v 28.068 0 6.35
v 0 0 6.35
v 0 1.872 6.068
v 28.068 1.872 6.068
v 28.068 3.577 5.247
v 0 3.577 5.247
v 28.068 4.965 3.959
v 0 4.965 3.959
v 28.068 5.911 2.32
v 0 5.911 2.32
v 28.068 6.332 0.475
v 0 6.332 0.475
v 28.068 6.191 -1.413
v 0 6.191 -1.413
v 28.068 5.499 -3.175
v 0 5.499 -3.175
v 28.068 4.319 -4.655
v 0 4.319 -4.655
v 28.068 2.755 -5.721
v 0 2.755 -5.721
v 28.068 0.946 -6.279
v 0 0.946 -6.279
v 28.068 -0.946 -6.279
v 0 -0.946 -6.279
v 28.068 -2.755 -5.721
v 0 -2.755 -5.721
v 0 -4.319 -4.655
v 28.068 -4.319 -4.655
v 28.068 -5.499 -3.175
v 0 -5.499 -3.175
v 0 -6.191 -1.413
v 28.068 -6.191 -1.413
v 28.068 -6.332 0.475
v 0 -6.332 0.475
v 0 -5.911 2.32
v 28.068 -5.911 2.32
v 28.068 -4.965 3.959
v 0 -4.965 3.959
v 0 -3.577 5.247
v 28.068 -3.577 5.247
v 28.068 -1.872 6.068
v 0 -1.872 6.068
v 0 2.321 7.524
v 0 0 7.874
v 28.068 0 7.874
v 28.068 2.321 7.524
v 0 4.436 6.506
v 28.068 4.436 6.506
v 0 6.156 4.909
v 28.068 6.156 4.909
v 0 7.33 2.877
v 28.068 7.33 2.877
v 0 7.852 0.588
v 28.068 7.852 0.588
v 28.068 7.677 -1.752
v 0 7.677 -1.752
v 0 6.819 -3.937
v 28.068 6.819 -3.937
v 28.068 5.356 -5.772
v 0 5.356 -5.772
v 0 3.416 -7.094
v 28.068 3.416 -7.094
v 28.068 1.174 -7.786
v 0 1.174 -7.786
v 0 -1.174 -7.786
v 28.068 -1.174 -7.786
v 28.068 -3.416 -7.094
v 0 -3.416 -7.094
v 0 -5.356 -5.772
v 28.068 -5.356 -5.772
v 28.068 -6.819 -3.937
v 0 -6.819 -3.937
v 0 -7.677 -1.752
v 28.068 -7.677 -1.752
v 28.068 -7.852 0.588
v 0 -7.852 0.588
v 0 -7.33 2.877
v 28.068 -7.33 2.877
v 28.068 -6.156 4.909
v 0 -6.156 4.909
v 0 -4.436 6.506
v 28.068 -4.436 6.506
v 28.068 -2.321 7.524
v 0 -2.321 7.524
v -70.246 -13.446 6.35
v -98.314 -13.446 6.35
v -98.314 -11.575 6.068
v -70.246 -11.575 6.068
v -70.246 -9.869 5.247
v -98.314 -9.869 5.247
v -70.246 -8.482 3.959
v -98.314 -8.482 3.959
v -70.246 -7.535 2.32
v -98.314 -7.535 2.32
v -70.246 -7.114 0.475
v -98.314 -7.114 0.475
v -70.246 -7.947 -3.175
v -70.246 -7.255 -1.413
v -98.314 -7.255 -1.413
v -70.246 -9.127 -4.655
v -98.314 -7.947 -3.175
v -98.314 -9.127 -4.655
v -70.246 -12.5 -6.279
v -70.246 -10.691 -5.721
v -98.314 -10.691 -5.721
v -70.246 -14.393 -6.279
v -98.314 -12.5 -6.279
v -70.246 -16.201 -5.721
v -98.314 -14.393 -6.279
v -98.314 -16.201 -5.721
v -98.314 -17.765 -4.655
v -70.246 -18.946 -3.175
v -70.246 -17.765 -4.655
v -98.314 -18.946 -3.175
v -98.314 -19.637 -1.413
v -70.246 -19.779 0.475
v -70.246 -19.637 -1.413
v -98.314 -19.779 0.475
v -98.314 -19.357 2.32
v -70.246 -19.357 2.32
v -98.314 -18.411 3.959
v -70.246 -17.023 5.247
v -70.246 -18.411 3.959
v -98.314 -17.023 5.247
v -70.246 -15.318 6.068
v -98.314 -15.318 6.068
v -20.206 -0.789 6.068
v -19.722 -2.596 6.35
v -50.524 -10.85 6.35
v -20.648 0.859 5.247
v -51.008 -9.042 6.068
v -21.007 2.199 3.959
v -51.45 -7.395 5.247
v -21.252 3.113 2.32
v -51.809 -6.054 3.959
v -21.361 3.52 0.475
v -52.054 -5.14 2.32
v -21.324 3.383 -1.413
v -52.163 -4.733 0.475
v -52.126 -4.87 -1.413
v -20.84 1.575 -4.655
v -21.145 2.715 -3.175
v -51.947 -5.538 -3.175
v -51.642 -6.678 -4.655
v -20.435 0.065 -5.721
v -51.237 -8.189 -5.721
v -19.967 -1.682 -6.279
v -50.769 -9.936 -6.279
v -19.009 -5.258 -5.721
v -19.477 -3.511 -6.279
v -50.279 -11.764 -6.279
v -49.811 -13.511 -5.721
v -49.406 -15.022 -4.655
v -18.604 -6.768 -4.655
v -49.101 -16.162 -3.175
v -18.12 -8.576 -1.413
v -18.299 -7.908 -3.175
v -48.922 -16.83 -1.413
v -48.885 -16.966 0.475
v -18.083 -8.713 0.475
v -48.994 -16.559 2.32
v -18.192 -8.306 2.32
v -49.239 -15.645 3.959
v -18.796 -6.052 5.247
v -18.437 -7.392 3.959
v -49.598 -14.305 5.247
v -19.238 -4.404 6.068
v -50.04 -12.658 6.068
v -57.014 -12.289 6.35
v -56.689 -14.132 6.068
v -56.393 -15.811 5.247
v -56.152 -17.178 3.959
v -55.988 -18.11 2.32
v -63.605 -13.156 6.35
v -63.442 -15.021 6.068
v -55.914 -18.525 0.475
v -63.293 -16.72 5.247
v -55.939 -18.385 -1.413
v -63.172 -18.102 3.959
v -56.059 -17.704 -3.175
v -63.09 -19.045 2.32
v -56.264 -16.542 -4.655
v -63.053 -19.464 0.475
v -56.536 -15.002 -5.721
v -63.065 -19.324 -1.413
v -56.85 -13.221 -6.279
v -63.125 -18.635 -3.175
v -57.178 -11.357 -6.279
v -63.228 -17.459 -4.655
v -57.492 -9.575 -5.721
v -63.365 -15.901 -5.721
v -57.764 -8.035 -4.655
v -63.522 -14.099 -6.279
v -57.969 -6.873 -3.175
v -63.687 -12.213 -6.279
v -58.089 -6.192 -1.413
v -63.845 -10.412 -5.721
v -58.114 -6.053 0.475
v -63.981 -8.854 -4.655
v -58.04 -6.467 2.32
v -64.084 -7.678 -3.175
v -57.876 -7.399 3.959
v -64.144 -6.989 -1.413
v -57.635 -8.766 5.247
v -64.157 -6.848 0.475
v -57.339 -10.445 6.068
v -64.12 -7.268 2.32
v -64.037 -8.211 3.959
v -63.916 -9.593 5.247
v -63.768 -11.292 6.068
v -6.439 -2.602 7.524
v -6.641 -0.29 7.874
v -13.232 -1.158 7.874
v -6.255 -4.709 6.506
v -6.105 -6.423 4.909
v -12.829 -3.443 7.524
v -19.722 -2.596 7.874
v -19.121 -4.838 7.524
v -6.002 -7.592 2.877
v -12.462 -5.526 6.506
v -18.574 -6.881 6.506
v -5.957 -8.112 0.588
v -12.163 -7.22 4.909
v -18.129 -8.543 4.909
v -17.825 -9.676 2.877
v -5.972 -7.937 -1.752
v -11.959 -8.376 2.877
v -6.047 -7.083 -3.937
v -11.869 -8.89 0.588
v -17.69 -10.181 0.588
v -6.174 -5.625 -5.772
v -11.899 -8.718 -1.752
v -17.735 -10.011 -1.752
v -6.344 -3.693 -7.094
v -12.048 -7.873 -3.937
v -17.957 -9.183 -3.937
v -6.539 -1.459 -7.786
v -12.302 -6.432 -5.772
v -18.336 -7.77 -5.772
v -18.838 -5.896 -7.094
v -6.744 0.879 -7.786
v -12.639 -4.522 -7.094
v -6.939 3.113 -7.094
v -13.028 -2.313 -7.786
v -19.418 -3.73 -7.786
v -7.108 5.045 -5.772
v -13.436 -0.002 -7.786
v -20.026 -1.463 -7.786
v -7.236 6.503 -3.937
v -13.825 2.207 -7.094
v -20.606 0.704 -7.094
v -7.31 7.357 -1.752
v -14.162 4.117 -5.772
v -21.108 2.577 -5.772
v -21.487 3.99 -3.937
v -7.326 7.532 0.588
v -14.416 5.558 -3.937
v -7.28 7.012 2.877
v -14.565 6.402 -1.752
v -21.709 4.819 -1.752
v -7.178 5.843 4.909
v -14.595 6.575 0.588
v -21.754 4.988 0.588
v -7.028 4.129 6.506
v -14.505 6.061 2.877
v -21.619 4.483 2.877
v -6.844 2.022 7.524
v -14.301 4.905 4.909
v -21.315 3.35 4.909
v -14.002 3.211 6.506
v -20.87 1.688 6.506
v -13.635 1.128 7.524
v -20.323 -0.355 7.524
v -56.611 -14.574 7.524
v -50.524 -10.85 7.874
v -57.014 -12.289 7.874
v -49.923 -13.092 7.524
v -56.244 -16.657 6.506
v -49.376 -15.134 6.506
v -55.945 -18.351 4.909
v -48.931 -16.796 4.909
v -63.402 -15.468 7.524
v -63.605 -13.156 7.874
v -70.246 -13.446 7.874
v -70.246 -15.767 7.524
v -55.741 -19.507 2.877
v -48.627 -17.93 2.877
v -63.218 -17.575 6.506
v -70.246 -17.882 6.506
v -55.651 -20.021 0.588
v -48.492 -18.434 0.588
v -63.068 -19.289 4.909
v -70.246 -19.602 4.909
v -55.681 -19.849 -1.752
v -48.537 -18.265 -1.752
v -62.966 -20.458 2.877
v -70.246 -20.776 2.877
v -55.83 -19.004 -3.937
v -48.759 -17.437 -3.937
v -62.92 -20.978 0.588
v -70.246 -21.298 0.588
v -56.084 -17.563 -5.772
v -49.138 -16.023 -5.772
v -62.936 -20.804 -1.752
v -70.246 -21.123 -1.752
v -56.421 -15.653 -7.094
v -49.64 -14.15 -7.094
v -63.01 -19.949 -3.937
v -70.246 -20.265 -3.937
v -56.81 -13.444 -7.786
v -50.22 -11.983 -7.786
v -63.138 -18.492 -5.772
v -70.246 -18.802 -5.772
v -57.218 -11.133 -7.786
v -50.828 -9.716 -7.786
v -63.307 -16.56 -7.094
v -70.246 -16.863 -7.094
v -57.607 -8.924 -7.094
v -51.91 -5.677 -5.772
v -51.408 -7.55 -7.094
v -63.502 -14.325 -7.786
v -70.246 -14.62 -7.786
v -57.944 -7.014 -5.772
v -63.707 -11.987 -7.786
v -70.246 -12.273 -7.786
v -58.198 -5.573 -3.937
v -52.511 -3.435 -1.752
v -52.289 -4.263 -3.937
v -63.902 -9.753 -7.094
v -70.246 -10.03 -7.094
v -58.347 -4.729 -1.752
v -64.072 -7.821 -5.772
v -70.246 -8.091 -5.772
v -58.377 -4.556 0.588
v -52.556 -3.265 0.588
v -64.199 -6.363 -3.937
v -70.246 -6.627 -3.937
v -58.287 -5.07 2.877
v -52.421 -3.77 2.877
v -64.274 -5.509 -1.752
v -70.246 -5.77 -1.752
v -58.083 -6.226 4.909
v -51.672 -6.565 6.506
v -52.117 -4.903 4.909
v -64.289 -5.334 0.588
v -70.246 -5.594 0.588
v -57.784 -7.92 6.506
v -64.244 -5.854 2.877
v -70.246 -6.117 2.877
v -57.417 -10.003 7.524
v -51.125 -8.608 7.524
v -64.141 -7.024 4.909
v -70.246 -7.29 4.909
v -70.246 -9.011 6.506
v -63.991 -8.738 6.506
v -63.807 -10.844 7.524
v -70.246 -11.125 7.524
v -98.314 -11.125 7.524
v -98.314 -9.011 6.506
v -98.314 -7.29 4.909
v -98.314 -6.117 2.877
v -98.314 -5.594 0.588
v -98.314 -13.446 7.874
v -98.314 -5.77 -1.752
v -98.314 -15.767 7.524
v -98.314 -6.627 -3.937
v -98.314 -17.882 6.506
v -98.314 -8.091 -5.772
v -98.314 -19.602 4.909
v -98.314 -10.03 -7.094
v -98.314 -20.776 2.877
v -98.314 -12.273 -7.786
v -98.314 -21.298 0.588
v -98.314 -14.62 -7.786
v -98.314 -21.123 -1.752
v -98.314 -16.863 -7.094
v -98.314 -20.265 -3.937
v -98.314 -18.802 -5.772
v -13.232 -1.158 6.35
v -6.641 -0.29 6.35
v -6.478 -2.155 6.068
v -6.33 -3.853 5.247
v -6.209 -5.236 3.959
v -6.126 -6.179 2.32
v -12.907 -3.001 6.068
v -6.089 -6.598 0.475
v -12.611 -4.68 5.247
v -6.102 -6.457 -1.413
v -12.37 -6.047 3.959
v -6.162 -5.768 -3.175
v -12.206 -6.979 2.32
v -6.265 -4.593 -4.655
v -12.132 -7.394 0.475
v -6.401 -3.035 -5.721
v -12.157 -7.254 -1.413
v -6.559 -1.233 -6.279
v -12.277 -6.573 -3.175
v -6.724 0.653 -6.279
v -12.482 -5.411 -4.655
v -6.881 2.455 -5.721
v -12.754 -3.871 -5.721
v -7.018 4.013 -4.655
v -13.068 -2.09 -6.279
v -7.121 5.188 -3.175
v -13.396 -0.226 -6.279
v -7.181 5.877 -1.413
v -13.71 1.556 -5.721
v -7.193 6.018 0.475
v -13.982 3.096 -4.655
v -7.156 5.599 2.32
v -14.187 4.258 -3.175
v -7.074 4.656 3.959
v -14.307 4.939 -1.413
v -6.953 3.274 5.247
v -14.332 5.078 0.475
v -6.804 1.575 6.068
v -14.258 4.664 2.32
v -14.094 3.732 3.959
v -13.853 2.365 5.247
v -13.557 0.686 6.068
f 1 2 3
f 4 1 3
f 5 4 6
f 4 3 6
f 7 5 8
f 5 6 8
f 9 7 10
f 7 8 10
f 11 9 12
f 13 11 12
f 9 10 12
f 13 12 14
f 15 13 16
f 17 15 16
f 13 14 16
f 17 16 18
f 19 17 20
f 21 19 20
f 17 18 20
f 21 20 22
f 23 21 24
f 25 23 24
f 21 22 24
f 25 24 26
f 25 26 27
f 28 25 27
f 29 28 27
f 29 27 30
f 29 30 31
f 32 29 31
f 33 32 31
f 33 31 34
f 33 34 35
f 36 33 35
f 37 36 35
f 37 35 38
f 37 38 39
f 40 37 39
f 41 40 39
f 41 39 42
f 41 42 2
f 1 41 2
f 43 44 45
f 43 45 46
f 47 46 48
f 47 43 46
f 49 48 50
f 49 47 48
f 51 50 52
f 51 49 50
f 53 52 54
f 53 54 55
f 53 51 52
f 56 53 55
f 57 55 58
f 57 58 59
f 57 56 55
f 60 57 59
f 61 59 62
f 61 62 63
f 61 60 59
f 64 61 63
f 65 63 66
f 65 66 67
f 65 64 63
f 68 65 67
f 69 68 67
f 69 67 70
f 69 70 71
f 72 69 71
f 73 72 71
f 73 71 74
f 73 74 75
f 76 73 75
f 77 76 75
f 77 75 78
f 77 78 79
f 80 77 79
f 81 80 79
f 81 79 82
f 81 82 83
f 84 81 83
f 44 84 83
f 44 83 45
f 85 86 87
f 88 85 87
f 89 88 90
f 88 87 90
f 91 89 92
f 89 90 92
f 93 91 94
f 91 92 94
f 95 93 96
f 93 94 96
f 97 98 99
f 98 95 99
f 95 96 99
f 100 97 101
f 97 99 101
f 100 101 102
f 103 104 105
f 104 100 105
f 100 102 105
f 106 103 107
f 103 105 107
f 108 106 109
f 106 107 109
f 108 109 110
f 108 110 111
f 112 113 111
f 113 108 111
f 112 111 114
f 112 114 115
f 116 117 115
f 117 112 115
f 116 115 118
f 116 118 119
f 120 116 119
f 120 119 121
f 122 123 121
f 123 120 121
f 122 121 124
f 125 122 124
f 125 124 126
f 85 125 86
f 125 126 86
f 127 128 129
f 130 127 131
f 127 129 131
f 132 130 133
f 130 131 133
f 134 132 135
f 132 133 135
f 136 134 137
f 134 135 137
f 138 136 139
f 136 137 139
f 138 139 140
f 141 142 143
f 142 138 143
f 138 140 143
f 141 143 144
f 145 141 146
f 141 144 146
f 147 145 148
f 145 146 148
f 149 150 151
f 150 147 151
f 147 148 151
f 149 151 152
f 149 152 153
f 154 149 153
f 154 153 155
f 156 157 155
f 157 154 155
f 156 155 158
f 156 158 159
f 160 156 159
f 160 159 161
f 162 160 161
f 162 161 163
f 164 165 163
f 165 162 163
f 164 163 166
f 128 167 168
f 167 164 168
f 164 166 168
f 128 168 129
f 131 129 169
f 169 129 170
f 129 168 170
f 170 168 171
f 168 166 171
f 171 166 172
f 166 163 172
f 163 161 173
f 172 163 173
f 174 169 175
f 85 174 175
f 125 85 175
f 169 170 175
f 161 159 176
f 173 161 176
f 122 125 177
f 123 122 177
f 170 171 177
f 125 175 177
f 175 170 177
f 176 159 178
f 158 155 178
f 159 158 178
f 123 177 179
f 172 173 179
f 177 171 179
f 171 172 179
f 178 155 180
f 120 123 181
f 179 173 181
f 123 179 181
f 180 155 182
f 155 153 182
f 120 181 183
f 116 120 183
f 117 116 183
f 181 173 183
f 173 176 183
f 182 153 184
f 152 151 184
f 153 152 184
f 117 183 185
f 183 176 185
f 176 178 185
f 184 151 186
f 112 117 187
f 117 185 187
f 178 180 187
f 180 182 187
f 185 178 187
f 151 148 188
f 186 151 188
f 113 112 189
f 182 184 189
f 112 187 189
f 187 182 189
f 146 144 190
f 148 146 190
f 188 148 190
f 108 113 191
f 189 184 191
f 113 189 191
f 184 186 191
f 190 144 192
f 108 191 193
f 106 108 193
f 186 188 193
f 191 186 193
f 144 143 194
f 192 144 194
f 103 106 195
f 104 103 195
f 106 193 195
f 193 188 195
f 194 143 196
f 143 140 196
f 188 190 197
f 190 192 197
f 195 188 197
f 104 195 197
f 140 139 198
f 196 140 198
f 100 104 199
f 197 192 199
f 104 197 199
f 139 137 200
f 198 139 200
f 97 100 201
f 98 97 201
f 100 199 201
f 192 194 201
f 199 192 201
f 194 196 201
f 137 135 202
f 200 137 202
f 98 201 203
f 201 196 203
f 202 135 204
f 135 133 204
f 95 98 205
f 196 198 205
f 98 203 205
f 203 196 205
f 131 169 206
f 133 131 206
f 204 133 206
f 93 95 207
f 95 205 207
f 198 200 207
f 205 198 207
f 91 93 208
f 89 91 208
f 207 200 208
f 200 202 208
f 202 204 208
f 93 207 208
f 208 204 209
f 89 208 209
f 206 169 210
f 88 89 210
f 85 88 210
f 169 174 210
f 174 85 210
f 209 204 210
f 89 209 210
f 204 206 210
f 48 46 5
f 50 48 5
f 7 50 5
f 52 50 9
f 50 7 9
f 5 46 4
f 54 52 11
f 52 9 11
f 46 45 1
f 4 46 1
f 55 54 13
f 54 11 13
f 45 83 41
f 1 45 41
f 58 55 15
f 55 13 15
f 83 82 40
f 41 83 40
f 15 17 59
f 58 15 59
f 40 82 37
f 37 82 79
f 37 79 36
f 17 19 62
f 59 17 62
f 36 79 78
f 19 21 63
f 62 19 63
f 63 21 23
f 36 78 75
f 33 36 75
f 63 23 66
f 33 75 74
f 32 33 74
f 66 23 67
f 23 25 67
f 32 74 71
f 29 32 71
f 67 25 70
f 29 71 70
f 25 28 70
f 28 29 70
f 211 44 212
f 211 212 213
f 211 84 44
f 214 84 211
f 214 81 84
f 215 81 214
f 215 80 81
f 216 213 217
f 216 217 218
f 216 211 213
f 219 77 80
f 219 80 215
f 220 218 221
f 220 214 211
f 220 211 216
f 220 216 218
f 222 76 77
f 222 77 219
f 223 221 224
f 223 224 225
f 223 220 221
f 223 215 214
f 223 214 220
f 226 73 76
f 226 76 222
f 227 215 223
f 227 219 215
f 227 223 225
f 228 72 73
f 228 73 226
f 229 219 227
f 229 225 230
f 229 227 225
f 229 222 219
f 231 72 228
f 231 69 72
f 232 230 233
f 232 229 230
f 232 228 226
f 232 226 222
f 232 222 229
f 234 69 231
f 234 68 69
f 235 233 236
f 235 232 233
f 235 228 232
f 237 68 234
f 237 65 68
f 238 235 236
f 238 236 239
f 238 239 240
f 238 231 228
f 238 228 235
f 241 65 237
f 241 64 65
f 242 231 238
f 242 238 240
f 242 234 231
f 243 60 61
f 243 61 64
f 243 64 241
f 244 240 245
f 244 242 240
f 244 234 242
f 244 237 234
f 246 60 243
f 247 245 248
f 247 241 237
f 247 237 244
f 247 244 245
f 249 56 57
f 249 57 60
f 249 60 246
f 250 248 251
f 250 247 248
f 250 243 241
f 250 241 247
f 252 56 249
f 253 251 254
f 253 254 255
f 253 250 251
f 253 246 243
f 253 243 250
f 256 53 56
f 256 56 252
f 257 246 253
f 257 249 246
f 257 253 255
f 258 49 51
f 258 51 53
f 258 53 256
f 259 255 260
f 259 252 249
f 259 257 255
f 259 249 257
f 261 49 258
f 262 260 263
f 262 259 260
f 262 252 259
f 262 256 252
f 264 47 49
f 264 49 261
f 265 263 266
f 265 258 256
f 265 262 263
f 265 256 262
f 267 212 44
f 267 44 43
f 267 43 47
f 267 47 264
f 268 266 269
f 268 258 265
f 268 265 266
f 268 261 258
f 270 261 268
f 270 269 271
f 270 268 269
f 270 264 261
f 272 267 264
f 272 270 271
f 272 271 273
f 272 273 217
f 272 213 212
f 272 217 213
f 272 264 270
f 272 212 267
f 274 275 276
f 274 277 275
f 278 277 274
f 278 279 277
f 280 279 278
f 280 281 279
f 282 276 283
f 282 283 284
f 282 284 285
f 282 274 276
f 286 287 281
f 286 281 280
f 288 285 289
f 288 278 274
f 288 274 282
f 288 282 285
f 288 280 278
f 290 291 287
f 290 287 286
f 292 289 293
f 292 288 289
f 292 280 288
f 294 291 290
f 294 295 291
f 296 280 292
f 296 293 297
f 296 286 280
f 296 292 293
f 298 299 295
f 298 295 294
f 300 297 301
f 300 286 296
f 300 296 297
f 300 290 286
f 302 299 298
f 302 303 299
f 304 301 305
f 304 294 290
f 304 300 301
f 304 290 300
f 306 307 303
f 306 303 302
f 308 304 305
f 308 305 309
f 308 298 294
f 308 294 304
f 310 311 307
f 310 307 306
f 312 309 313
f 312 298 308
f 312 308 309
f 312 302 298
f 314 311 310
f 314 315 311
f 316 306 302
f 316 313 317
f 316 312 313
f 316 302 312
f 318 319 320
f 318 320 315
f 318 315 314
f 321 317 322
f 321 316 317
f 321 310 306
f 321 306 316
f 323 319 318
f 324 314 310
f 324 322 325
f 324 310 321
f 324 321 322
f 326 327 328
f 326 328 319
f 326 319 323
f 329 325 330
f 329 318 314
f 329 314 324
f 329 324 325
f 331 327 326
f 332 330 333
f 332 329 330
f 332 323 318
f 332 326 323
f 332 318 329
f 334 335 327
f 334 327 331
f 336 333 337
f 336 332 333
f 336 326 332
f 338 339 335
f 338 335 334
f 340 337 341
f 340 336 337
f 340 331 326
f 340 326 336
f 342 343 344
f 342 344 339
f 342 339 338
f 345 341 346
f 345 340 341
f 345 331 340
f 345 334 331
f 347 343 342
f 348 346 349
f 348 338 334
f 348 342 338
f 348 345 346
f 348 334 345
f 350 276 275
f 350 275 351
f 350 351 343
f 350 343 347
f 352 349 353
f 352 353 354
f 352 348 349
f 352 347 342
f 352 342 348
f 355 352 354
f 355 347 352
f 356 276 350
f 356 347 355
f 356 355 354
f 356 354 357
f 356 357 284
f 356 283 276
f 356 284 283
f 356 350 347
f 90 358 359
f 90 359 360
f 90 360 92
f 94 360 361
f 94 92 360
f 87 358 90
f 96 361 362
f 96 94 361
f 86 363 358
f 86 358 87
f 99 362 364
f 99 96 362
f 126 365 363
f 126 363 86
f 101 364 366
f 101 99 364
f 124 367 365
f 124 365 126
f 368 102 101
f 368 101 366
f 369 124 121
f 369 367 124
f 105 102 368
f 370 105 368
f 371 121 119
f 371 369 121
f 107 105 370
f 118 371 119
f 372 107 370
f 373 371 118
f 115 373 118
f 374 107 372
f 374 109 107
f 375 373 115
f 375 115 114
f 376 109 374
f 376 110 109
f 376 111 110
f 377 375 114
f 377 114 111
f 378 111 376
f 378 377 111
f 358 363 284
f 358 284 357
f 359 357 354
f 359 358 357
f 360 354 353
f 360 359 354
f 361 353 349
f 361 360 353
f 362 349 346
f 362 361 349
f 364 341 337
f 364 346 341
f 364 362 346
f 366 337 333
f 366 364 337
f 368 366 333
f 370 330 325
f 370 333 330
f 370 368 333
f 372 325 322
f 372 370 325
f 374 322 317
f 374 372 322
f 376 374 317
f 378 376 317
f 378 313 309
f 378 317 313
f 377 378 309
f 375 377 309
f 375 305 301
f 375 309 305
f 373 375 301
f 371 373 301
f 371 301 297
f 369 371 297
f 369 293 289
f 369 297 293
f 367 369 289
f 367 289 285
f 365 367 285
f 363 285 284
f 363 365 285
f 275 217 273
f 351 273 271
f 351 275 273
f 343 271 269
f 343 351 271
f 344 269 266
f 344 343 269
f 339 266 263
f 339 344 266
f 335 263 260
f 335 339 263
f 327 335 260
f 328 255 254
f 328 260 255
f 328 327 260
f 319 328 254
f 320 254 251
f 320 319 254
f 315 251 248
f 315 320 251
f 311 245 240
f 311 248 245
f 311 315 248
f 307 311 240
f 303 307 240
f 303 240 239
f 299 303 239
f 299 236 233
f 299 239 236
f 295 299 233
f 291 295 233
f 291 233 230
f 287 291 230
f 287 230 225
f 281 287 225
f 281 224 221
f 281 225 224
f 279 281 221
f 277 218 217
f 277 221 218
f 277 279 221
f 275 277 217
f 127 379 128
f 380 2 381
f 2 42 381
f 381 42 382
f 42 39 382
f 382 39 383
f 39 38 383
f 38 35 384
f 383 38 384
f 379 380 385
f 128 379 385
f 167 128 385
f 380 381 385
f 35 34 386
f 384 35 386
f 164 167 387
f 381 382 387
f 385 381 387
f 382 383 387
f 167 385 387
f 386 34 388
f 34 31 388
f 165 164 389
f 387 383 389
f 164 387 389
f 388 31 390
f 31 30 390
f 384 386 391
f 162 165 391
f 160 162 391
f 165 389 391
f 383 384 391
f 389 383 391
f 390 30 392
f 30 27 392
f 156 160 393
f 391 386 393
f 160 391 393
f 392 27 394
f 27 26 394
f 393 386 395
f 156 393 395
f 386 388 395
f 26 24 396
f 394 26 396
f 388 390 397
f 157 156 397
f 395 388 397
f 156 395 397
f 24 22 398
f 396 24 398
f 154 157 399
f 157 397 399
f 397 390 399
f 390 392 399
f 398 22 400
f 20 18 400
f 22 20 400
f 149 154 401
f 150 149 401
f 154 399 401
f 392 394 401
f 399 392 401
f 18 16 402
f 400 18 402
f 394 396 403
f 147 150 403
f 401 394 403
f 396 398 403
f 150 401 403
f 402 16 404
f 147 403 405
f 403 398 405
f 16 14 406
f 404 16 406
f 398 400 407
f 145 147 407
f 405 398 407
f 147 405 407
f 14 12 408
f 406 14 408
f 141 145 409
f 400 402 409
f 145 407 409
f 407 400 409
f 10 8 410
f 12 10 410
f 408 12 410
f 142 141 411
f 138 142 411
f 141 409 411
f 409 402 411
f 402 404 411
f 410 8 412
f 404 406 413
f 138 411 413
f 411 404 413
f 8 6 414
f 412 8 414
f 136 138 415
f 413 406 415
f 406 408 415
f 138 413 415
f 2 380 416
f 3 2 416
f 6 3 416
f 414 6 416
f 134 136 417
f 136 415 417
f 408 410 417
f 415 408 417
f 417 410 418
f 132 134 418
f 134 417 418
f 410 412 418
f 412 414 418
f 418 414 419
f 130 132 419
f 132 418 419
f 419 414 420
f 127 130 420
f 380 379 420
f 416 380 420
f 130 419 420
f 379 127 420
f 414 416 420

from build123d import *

# Parameters (mm, degrees)
SKETCH2_R   = 7.874
SKETCH2_R_2 = 6.35


with BuildPart() as part:
    # Sweep1: sweep along a path in Sketch1
    with BuildLine(Plane.XY) as sweep1_path:
        Line((28.068079684, 0), (0, 0))
        ThreePointArc((0, 0), (-9.946095847, -0.651901563), (-19.722011237, -2.596452037))
        Line((-19.722011237, -2.596452037), (-50.523992361, -10.849818004))
        ThreePointArc((-50.523992361, -10.849818004), (-60.299907751, -12.794368478), (-70.246003598, -13.446270041))
        Line((-70.246003598, -13.446270041), (-98.314083282, -13.446270041))
    # Sketch2 → Sweep1 (sweep)
    with BuildSketch(Plane.ZY.offset(-28.068079684)):
        Circle(SKETCH2_R)
        Circle(SKETCH2_R_2, mode=Mode.SUBTRACT)
    sweep(path=sweep1_path.line)


solid = part.part
